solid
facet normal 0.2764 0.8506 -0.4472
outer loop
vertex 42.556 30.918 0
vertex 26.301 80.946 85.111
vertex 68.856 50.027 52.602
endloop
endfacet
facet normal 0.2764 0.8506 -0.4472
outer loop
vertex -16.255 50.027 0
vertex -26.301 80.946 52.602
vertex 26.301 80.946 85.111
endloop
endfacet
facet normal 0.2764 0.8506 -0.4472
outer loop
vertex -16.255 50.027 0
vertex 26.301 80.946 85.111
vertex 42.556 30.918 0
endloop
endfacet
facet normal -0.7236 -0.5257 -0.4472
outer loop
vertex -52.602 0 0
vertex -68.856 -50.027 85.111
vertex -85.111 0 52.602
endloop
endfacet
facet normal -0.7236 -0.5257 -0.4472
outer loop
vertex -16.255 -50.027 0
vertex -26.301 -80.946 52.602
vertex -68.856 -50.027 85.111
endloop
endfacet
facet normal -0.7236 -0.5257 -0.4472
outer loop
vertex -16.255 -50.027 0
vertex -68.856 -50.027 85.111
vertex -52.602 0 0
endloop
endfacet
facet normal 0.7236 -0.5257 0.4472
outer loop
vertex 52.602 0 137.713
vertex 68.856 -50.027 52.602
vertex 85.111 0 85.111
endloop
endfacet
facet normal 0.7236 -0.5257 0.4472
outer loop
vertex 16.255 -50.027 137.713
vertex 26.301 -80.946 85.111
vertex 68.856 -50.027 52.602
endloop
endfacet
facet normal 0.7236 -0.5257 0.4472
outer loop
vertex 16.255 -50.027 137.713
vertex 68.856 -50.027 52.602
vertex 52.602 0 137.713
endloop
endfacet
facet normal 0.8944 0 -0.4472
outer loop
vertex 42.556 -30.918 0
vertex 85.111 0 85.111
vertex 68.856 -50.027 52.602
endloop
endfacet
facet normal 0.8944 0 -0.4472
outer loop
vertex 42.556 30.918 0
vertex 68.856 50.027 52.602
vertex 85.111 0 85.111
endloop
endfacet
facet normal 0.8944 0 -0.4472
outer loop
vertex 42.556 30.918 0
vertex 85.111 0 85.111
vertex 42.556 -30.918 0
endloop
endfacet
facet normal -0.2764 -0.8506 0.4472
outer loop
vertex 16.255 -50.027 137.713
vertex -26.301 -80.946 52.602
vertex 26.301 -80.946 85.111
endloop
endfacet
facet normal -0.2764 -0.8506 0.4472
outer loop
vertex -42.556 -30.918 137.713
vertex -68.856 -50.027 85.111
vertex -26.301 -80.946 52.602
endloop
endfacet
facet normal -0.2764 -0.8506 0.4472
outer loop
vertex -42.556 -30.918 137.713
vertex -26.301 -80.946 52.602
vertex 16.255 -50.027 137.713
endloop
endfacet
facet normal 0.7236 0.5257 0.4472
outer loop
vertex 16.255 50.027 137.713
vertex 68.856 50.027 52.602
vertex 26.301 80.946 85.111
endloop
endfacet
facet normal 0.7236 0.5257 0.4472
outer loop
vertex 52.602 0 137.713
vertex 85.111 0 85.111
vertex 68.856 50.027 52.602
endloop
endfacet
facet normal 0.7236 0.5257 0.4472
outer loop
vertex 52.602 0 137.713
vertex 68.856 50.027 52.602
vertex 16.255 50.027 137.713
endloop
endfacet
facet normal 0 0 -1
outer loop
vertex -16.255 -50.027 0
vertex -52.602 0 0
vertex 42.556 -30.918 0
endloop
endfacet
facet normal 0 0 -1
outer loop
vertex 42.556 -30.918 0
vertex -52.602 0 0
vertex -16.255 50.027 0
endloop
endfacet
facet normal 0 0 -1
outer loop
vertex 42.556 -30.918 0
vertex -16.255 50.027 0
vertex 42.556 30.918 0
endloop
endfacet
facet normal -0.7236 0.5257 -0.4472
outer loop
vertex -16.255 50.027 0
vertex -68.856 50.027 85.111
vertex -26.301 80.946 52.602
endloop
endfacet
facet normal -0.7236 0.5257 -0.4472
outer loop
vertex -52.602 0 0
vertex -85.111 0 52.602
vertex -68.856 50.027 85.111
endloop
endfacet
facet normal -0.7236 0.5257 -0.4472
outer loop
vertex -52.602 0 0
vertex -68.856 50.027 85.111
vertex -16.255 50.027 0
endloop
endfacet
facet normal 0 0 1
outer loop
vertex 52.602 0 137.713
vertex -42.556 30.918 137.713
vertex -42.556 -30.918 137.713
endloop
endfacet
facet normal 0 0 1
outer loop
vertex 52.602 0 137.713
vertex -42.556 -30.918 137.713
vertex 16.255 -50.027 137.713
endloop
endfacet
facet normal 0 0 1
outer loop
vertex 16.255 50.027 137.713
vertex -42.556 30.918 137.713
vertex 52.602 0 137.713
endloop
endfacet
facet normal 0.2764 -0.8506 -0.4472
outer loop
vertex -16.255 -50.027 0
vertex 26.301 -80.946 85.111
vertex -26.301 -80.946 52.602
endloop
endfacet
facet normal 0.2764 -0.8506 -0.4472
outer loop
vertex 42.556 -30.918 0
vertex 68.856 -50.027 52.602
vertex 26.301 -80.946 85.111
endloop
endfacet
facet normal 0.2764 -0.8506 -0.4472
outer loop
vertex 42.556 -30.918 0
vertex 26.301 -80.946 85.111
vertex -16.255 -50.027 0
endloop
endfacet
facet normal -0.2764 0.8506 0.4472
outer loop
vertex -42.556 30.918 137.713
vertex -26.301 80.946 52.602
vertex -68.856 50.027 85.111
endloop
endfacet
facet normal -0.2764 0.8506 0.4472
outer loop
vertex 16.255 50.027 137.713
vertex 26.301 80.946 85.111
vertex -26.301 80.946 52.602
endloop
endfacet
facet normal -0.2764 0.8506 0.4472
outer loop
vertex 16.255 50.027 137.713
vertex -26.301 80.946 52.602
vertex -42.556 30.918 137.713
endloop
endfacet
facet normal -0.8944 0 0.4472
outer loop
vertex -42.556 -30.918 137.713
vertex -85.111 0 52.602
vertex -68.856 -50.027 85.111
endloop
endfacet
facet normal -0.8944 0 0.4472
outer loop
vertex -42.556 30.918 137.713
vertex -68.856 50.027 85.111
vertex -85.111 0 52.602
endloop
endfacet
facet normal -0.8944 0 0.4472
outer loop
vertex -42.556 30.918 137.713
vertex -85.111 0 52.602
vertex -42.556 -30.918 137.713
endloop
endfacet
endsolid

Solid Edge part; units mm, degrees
sketch "Sketch1" plane through (0, 0, 0) normal (0, -1, 0) x (1, 0, 0)
  line L0 (0, 155.506) -> (0, -17.7931)
  arc A0 (0, 155.5061) -> (0, -17.7931) centre (0, 68.8565) cw
revolve "RevolvedProtrusion1" add sketch "Sketch1" angle 360 about axis through (0, 0, 155.506) along (0, 0, -1)
sketch "Sketch2" plane through (0, 0, 0) normal (0, -1, 0) x (1, 0, 0)
  line L0 (85.1113, 85.1113) -> (42.5556, 0)
  line L1 (52.6017, 137.7129) -> (85.1113, 85.1113)
  line L2 (-42.5556, 137.7129) -> (52.6017, 137.7129)
  line L3 (-85.1113, 52.6017) -> (-42.5556, 137.7129)
  line L4 (-52.6017, 0) -> (-85.1113, 52.6017)
extrude "Cutout1" cut sketch "Sketch2" along normal mid plane 283.089 material side at (63.8782, 0, 42.5333)
pattern_circular "Pattern1" count 5 over 360 about axis through (0, 0, 137.7129) along (0, 0, 1) of "Cutout1"
sketch "Sketch3" plane through (0, 0, 0) normal (0, 0, 1) x (1, 0, 0)
  circle A0 centre (0, 0) radius 117.0383
extrude "ExtrudedCutout_6" cut sketch "Sketch3" against normal blind 94.7603
